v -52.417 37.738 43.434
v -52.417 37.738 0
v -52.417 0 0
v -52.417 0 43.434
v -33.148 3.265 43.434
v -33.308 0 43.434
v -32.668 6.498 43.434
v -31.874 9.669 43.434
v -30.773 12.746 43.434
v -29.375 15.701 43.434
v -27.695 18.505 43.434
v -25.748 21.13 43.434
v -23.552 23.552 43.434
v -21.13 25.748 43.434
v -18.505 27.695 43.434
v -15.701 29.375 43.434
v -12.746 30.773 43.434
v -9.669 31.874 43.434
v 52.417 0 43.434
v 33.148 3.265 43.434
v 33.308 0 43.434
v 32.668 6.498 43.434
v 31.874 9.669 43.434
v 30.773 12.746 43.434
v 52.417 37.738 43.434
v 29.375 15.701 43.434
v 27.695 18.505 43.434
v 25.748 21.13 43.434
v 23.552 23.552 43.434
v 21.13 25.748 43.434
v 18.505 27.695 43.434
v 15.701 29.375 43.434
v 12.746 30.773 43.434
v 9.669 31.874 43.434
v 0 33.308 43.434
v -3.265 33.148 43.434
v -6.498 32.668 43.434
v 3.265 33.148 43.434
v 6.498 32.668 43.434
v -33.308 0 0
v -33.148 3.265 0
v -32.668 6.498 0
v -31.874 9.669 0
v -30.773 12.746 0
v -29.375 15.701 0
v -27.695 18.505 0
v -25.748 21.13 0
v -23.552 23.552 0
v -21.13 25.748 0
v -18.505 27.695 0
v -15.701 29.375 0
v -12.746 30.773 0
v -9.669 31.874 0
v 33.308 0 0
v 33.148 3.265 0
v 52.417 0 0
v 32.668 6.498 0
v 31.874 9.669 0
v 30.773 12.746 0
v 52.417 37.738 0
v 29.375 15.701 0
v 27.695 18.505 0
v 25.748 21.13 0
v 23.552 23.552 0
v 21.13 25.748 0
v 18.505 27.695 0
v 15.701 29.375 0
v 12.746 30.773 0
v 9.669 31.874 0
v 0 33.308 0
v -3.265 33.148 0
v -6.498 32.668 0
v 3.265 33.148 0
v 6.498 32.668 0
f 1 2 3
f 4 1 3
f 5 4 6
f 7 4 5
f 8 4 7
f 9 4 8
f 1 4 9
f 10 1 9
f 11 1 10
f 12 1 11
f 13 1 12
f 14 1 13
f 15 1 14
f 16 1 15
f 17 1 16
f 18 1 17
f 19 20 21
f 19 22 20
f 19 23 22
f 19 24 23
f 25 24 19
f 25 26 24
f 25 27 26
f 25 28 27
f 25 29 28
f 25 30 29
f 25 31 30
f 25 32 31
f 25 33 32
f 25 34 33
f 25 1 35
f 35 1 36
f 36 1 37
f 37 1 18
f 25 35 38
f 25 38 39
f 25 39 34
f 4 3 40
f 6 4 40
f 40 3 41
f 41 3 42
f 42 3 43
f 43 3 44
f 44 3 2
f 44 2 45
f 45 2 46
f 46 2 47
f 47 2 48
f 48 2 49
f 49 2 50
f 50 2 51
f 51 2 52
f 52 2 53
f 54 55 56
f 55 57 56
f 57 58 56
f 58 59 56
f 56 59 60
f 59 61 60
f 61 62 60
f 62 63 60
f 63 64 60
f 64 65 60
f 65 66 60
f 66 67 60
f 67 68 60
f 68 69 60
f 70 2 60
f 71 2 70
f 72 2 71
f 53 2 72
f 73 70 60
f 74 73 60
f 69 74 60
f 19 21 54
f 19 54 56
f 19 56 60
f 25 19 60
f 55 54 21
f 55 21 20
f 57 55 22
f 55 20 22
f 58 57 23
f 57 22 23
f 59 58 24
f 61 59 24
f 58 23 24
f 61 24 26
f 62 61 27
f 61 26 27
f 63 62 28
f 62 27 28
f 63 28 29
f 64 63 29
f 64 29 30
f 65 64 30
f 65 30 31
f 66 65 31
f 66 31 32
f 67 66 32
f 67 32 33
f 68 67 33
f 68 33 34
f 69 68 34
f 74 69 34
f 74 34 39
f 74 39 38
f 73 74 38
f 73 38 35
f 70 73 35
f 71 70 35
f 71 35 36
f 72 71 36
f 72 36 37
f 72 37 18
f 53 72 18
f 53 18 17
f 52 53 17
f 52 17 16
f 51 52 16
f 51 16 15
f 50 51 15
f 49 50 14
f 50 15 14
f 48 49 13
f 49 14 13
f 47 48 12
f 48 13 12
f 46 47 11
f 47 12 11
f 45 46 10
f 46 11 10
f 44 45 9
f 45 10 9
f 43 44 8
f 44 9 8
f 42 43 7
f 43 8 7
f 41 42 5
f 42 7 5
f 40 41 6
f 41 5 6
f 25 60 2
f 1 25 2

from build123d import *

# Parameters (mm, degrees)
F1_DEPTH = 43.434
F3_DEPTH = 43.435


with BuildPart() as f1:
    # F0 (on Top) → F1 (new body)
    with BuildSketch(Plane.XY):
        Polygon((0, 37.737992), (-52.417379, 37.737992), (-52.417379, 0), (52.417379, 0), (52.417379, 37.737992), align=None)
    extrude(amount=F1_DEPTH)

    # F2 (on face) → F3 (cut, through all)
    with BuildSketch(Plane.XY.offset(43.434)):
        with BuildLine():
            Line((-33.308111, 0), (33.308111, 0))
            ThreePointArc((33.308111, 0), (0, 33.308111), (-33.308111, 0))
        make_face()
    extrude(amount=-F3_DEPTH, mode=Mode.SUBTRACT)


solid = f1.part
